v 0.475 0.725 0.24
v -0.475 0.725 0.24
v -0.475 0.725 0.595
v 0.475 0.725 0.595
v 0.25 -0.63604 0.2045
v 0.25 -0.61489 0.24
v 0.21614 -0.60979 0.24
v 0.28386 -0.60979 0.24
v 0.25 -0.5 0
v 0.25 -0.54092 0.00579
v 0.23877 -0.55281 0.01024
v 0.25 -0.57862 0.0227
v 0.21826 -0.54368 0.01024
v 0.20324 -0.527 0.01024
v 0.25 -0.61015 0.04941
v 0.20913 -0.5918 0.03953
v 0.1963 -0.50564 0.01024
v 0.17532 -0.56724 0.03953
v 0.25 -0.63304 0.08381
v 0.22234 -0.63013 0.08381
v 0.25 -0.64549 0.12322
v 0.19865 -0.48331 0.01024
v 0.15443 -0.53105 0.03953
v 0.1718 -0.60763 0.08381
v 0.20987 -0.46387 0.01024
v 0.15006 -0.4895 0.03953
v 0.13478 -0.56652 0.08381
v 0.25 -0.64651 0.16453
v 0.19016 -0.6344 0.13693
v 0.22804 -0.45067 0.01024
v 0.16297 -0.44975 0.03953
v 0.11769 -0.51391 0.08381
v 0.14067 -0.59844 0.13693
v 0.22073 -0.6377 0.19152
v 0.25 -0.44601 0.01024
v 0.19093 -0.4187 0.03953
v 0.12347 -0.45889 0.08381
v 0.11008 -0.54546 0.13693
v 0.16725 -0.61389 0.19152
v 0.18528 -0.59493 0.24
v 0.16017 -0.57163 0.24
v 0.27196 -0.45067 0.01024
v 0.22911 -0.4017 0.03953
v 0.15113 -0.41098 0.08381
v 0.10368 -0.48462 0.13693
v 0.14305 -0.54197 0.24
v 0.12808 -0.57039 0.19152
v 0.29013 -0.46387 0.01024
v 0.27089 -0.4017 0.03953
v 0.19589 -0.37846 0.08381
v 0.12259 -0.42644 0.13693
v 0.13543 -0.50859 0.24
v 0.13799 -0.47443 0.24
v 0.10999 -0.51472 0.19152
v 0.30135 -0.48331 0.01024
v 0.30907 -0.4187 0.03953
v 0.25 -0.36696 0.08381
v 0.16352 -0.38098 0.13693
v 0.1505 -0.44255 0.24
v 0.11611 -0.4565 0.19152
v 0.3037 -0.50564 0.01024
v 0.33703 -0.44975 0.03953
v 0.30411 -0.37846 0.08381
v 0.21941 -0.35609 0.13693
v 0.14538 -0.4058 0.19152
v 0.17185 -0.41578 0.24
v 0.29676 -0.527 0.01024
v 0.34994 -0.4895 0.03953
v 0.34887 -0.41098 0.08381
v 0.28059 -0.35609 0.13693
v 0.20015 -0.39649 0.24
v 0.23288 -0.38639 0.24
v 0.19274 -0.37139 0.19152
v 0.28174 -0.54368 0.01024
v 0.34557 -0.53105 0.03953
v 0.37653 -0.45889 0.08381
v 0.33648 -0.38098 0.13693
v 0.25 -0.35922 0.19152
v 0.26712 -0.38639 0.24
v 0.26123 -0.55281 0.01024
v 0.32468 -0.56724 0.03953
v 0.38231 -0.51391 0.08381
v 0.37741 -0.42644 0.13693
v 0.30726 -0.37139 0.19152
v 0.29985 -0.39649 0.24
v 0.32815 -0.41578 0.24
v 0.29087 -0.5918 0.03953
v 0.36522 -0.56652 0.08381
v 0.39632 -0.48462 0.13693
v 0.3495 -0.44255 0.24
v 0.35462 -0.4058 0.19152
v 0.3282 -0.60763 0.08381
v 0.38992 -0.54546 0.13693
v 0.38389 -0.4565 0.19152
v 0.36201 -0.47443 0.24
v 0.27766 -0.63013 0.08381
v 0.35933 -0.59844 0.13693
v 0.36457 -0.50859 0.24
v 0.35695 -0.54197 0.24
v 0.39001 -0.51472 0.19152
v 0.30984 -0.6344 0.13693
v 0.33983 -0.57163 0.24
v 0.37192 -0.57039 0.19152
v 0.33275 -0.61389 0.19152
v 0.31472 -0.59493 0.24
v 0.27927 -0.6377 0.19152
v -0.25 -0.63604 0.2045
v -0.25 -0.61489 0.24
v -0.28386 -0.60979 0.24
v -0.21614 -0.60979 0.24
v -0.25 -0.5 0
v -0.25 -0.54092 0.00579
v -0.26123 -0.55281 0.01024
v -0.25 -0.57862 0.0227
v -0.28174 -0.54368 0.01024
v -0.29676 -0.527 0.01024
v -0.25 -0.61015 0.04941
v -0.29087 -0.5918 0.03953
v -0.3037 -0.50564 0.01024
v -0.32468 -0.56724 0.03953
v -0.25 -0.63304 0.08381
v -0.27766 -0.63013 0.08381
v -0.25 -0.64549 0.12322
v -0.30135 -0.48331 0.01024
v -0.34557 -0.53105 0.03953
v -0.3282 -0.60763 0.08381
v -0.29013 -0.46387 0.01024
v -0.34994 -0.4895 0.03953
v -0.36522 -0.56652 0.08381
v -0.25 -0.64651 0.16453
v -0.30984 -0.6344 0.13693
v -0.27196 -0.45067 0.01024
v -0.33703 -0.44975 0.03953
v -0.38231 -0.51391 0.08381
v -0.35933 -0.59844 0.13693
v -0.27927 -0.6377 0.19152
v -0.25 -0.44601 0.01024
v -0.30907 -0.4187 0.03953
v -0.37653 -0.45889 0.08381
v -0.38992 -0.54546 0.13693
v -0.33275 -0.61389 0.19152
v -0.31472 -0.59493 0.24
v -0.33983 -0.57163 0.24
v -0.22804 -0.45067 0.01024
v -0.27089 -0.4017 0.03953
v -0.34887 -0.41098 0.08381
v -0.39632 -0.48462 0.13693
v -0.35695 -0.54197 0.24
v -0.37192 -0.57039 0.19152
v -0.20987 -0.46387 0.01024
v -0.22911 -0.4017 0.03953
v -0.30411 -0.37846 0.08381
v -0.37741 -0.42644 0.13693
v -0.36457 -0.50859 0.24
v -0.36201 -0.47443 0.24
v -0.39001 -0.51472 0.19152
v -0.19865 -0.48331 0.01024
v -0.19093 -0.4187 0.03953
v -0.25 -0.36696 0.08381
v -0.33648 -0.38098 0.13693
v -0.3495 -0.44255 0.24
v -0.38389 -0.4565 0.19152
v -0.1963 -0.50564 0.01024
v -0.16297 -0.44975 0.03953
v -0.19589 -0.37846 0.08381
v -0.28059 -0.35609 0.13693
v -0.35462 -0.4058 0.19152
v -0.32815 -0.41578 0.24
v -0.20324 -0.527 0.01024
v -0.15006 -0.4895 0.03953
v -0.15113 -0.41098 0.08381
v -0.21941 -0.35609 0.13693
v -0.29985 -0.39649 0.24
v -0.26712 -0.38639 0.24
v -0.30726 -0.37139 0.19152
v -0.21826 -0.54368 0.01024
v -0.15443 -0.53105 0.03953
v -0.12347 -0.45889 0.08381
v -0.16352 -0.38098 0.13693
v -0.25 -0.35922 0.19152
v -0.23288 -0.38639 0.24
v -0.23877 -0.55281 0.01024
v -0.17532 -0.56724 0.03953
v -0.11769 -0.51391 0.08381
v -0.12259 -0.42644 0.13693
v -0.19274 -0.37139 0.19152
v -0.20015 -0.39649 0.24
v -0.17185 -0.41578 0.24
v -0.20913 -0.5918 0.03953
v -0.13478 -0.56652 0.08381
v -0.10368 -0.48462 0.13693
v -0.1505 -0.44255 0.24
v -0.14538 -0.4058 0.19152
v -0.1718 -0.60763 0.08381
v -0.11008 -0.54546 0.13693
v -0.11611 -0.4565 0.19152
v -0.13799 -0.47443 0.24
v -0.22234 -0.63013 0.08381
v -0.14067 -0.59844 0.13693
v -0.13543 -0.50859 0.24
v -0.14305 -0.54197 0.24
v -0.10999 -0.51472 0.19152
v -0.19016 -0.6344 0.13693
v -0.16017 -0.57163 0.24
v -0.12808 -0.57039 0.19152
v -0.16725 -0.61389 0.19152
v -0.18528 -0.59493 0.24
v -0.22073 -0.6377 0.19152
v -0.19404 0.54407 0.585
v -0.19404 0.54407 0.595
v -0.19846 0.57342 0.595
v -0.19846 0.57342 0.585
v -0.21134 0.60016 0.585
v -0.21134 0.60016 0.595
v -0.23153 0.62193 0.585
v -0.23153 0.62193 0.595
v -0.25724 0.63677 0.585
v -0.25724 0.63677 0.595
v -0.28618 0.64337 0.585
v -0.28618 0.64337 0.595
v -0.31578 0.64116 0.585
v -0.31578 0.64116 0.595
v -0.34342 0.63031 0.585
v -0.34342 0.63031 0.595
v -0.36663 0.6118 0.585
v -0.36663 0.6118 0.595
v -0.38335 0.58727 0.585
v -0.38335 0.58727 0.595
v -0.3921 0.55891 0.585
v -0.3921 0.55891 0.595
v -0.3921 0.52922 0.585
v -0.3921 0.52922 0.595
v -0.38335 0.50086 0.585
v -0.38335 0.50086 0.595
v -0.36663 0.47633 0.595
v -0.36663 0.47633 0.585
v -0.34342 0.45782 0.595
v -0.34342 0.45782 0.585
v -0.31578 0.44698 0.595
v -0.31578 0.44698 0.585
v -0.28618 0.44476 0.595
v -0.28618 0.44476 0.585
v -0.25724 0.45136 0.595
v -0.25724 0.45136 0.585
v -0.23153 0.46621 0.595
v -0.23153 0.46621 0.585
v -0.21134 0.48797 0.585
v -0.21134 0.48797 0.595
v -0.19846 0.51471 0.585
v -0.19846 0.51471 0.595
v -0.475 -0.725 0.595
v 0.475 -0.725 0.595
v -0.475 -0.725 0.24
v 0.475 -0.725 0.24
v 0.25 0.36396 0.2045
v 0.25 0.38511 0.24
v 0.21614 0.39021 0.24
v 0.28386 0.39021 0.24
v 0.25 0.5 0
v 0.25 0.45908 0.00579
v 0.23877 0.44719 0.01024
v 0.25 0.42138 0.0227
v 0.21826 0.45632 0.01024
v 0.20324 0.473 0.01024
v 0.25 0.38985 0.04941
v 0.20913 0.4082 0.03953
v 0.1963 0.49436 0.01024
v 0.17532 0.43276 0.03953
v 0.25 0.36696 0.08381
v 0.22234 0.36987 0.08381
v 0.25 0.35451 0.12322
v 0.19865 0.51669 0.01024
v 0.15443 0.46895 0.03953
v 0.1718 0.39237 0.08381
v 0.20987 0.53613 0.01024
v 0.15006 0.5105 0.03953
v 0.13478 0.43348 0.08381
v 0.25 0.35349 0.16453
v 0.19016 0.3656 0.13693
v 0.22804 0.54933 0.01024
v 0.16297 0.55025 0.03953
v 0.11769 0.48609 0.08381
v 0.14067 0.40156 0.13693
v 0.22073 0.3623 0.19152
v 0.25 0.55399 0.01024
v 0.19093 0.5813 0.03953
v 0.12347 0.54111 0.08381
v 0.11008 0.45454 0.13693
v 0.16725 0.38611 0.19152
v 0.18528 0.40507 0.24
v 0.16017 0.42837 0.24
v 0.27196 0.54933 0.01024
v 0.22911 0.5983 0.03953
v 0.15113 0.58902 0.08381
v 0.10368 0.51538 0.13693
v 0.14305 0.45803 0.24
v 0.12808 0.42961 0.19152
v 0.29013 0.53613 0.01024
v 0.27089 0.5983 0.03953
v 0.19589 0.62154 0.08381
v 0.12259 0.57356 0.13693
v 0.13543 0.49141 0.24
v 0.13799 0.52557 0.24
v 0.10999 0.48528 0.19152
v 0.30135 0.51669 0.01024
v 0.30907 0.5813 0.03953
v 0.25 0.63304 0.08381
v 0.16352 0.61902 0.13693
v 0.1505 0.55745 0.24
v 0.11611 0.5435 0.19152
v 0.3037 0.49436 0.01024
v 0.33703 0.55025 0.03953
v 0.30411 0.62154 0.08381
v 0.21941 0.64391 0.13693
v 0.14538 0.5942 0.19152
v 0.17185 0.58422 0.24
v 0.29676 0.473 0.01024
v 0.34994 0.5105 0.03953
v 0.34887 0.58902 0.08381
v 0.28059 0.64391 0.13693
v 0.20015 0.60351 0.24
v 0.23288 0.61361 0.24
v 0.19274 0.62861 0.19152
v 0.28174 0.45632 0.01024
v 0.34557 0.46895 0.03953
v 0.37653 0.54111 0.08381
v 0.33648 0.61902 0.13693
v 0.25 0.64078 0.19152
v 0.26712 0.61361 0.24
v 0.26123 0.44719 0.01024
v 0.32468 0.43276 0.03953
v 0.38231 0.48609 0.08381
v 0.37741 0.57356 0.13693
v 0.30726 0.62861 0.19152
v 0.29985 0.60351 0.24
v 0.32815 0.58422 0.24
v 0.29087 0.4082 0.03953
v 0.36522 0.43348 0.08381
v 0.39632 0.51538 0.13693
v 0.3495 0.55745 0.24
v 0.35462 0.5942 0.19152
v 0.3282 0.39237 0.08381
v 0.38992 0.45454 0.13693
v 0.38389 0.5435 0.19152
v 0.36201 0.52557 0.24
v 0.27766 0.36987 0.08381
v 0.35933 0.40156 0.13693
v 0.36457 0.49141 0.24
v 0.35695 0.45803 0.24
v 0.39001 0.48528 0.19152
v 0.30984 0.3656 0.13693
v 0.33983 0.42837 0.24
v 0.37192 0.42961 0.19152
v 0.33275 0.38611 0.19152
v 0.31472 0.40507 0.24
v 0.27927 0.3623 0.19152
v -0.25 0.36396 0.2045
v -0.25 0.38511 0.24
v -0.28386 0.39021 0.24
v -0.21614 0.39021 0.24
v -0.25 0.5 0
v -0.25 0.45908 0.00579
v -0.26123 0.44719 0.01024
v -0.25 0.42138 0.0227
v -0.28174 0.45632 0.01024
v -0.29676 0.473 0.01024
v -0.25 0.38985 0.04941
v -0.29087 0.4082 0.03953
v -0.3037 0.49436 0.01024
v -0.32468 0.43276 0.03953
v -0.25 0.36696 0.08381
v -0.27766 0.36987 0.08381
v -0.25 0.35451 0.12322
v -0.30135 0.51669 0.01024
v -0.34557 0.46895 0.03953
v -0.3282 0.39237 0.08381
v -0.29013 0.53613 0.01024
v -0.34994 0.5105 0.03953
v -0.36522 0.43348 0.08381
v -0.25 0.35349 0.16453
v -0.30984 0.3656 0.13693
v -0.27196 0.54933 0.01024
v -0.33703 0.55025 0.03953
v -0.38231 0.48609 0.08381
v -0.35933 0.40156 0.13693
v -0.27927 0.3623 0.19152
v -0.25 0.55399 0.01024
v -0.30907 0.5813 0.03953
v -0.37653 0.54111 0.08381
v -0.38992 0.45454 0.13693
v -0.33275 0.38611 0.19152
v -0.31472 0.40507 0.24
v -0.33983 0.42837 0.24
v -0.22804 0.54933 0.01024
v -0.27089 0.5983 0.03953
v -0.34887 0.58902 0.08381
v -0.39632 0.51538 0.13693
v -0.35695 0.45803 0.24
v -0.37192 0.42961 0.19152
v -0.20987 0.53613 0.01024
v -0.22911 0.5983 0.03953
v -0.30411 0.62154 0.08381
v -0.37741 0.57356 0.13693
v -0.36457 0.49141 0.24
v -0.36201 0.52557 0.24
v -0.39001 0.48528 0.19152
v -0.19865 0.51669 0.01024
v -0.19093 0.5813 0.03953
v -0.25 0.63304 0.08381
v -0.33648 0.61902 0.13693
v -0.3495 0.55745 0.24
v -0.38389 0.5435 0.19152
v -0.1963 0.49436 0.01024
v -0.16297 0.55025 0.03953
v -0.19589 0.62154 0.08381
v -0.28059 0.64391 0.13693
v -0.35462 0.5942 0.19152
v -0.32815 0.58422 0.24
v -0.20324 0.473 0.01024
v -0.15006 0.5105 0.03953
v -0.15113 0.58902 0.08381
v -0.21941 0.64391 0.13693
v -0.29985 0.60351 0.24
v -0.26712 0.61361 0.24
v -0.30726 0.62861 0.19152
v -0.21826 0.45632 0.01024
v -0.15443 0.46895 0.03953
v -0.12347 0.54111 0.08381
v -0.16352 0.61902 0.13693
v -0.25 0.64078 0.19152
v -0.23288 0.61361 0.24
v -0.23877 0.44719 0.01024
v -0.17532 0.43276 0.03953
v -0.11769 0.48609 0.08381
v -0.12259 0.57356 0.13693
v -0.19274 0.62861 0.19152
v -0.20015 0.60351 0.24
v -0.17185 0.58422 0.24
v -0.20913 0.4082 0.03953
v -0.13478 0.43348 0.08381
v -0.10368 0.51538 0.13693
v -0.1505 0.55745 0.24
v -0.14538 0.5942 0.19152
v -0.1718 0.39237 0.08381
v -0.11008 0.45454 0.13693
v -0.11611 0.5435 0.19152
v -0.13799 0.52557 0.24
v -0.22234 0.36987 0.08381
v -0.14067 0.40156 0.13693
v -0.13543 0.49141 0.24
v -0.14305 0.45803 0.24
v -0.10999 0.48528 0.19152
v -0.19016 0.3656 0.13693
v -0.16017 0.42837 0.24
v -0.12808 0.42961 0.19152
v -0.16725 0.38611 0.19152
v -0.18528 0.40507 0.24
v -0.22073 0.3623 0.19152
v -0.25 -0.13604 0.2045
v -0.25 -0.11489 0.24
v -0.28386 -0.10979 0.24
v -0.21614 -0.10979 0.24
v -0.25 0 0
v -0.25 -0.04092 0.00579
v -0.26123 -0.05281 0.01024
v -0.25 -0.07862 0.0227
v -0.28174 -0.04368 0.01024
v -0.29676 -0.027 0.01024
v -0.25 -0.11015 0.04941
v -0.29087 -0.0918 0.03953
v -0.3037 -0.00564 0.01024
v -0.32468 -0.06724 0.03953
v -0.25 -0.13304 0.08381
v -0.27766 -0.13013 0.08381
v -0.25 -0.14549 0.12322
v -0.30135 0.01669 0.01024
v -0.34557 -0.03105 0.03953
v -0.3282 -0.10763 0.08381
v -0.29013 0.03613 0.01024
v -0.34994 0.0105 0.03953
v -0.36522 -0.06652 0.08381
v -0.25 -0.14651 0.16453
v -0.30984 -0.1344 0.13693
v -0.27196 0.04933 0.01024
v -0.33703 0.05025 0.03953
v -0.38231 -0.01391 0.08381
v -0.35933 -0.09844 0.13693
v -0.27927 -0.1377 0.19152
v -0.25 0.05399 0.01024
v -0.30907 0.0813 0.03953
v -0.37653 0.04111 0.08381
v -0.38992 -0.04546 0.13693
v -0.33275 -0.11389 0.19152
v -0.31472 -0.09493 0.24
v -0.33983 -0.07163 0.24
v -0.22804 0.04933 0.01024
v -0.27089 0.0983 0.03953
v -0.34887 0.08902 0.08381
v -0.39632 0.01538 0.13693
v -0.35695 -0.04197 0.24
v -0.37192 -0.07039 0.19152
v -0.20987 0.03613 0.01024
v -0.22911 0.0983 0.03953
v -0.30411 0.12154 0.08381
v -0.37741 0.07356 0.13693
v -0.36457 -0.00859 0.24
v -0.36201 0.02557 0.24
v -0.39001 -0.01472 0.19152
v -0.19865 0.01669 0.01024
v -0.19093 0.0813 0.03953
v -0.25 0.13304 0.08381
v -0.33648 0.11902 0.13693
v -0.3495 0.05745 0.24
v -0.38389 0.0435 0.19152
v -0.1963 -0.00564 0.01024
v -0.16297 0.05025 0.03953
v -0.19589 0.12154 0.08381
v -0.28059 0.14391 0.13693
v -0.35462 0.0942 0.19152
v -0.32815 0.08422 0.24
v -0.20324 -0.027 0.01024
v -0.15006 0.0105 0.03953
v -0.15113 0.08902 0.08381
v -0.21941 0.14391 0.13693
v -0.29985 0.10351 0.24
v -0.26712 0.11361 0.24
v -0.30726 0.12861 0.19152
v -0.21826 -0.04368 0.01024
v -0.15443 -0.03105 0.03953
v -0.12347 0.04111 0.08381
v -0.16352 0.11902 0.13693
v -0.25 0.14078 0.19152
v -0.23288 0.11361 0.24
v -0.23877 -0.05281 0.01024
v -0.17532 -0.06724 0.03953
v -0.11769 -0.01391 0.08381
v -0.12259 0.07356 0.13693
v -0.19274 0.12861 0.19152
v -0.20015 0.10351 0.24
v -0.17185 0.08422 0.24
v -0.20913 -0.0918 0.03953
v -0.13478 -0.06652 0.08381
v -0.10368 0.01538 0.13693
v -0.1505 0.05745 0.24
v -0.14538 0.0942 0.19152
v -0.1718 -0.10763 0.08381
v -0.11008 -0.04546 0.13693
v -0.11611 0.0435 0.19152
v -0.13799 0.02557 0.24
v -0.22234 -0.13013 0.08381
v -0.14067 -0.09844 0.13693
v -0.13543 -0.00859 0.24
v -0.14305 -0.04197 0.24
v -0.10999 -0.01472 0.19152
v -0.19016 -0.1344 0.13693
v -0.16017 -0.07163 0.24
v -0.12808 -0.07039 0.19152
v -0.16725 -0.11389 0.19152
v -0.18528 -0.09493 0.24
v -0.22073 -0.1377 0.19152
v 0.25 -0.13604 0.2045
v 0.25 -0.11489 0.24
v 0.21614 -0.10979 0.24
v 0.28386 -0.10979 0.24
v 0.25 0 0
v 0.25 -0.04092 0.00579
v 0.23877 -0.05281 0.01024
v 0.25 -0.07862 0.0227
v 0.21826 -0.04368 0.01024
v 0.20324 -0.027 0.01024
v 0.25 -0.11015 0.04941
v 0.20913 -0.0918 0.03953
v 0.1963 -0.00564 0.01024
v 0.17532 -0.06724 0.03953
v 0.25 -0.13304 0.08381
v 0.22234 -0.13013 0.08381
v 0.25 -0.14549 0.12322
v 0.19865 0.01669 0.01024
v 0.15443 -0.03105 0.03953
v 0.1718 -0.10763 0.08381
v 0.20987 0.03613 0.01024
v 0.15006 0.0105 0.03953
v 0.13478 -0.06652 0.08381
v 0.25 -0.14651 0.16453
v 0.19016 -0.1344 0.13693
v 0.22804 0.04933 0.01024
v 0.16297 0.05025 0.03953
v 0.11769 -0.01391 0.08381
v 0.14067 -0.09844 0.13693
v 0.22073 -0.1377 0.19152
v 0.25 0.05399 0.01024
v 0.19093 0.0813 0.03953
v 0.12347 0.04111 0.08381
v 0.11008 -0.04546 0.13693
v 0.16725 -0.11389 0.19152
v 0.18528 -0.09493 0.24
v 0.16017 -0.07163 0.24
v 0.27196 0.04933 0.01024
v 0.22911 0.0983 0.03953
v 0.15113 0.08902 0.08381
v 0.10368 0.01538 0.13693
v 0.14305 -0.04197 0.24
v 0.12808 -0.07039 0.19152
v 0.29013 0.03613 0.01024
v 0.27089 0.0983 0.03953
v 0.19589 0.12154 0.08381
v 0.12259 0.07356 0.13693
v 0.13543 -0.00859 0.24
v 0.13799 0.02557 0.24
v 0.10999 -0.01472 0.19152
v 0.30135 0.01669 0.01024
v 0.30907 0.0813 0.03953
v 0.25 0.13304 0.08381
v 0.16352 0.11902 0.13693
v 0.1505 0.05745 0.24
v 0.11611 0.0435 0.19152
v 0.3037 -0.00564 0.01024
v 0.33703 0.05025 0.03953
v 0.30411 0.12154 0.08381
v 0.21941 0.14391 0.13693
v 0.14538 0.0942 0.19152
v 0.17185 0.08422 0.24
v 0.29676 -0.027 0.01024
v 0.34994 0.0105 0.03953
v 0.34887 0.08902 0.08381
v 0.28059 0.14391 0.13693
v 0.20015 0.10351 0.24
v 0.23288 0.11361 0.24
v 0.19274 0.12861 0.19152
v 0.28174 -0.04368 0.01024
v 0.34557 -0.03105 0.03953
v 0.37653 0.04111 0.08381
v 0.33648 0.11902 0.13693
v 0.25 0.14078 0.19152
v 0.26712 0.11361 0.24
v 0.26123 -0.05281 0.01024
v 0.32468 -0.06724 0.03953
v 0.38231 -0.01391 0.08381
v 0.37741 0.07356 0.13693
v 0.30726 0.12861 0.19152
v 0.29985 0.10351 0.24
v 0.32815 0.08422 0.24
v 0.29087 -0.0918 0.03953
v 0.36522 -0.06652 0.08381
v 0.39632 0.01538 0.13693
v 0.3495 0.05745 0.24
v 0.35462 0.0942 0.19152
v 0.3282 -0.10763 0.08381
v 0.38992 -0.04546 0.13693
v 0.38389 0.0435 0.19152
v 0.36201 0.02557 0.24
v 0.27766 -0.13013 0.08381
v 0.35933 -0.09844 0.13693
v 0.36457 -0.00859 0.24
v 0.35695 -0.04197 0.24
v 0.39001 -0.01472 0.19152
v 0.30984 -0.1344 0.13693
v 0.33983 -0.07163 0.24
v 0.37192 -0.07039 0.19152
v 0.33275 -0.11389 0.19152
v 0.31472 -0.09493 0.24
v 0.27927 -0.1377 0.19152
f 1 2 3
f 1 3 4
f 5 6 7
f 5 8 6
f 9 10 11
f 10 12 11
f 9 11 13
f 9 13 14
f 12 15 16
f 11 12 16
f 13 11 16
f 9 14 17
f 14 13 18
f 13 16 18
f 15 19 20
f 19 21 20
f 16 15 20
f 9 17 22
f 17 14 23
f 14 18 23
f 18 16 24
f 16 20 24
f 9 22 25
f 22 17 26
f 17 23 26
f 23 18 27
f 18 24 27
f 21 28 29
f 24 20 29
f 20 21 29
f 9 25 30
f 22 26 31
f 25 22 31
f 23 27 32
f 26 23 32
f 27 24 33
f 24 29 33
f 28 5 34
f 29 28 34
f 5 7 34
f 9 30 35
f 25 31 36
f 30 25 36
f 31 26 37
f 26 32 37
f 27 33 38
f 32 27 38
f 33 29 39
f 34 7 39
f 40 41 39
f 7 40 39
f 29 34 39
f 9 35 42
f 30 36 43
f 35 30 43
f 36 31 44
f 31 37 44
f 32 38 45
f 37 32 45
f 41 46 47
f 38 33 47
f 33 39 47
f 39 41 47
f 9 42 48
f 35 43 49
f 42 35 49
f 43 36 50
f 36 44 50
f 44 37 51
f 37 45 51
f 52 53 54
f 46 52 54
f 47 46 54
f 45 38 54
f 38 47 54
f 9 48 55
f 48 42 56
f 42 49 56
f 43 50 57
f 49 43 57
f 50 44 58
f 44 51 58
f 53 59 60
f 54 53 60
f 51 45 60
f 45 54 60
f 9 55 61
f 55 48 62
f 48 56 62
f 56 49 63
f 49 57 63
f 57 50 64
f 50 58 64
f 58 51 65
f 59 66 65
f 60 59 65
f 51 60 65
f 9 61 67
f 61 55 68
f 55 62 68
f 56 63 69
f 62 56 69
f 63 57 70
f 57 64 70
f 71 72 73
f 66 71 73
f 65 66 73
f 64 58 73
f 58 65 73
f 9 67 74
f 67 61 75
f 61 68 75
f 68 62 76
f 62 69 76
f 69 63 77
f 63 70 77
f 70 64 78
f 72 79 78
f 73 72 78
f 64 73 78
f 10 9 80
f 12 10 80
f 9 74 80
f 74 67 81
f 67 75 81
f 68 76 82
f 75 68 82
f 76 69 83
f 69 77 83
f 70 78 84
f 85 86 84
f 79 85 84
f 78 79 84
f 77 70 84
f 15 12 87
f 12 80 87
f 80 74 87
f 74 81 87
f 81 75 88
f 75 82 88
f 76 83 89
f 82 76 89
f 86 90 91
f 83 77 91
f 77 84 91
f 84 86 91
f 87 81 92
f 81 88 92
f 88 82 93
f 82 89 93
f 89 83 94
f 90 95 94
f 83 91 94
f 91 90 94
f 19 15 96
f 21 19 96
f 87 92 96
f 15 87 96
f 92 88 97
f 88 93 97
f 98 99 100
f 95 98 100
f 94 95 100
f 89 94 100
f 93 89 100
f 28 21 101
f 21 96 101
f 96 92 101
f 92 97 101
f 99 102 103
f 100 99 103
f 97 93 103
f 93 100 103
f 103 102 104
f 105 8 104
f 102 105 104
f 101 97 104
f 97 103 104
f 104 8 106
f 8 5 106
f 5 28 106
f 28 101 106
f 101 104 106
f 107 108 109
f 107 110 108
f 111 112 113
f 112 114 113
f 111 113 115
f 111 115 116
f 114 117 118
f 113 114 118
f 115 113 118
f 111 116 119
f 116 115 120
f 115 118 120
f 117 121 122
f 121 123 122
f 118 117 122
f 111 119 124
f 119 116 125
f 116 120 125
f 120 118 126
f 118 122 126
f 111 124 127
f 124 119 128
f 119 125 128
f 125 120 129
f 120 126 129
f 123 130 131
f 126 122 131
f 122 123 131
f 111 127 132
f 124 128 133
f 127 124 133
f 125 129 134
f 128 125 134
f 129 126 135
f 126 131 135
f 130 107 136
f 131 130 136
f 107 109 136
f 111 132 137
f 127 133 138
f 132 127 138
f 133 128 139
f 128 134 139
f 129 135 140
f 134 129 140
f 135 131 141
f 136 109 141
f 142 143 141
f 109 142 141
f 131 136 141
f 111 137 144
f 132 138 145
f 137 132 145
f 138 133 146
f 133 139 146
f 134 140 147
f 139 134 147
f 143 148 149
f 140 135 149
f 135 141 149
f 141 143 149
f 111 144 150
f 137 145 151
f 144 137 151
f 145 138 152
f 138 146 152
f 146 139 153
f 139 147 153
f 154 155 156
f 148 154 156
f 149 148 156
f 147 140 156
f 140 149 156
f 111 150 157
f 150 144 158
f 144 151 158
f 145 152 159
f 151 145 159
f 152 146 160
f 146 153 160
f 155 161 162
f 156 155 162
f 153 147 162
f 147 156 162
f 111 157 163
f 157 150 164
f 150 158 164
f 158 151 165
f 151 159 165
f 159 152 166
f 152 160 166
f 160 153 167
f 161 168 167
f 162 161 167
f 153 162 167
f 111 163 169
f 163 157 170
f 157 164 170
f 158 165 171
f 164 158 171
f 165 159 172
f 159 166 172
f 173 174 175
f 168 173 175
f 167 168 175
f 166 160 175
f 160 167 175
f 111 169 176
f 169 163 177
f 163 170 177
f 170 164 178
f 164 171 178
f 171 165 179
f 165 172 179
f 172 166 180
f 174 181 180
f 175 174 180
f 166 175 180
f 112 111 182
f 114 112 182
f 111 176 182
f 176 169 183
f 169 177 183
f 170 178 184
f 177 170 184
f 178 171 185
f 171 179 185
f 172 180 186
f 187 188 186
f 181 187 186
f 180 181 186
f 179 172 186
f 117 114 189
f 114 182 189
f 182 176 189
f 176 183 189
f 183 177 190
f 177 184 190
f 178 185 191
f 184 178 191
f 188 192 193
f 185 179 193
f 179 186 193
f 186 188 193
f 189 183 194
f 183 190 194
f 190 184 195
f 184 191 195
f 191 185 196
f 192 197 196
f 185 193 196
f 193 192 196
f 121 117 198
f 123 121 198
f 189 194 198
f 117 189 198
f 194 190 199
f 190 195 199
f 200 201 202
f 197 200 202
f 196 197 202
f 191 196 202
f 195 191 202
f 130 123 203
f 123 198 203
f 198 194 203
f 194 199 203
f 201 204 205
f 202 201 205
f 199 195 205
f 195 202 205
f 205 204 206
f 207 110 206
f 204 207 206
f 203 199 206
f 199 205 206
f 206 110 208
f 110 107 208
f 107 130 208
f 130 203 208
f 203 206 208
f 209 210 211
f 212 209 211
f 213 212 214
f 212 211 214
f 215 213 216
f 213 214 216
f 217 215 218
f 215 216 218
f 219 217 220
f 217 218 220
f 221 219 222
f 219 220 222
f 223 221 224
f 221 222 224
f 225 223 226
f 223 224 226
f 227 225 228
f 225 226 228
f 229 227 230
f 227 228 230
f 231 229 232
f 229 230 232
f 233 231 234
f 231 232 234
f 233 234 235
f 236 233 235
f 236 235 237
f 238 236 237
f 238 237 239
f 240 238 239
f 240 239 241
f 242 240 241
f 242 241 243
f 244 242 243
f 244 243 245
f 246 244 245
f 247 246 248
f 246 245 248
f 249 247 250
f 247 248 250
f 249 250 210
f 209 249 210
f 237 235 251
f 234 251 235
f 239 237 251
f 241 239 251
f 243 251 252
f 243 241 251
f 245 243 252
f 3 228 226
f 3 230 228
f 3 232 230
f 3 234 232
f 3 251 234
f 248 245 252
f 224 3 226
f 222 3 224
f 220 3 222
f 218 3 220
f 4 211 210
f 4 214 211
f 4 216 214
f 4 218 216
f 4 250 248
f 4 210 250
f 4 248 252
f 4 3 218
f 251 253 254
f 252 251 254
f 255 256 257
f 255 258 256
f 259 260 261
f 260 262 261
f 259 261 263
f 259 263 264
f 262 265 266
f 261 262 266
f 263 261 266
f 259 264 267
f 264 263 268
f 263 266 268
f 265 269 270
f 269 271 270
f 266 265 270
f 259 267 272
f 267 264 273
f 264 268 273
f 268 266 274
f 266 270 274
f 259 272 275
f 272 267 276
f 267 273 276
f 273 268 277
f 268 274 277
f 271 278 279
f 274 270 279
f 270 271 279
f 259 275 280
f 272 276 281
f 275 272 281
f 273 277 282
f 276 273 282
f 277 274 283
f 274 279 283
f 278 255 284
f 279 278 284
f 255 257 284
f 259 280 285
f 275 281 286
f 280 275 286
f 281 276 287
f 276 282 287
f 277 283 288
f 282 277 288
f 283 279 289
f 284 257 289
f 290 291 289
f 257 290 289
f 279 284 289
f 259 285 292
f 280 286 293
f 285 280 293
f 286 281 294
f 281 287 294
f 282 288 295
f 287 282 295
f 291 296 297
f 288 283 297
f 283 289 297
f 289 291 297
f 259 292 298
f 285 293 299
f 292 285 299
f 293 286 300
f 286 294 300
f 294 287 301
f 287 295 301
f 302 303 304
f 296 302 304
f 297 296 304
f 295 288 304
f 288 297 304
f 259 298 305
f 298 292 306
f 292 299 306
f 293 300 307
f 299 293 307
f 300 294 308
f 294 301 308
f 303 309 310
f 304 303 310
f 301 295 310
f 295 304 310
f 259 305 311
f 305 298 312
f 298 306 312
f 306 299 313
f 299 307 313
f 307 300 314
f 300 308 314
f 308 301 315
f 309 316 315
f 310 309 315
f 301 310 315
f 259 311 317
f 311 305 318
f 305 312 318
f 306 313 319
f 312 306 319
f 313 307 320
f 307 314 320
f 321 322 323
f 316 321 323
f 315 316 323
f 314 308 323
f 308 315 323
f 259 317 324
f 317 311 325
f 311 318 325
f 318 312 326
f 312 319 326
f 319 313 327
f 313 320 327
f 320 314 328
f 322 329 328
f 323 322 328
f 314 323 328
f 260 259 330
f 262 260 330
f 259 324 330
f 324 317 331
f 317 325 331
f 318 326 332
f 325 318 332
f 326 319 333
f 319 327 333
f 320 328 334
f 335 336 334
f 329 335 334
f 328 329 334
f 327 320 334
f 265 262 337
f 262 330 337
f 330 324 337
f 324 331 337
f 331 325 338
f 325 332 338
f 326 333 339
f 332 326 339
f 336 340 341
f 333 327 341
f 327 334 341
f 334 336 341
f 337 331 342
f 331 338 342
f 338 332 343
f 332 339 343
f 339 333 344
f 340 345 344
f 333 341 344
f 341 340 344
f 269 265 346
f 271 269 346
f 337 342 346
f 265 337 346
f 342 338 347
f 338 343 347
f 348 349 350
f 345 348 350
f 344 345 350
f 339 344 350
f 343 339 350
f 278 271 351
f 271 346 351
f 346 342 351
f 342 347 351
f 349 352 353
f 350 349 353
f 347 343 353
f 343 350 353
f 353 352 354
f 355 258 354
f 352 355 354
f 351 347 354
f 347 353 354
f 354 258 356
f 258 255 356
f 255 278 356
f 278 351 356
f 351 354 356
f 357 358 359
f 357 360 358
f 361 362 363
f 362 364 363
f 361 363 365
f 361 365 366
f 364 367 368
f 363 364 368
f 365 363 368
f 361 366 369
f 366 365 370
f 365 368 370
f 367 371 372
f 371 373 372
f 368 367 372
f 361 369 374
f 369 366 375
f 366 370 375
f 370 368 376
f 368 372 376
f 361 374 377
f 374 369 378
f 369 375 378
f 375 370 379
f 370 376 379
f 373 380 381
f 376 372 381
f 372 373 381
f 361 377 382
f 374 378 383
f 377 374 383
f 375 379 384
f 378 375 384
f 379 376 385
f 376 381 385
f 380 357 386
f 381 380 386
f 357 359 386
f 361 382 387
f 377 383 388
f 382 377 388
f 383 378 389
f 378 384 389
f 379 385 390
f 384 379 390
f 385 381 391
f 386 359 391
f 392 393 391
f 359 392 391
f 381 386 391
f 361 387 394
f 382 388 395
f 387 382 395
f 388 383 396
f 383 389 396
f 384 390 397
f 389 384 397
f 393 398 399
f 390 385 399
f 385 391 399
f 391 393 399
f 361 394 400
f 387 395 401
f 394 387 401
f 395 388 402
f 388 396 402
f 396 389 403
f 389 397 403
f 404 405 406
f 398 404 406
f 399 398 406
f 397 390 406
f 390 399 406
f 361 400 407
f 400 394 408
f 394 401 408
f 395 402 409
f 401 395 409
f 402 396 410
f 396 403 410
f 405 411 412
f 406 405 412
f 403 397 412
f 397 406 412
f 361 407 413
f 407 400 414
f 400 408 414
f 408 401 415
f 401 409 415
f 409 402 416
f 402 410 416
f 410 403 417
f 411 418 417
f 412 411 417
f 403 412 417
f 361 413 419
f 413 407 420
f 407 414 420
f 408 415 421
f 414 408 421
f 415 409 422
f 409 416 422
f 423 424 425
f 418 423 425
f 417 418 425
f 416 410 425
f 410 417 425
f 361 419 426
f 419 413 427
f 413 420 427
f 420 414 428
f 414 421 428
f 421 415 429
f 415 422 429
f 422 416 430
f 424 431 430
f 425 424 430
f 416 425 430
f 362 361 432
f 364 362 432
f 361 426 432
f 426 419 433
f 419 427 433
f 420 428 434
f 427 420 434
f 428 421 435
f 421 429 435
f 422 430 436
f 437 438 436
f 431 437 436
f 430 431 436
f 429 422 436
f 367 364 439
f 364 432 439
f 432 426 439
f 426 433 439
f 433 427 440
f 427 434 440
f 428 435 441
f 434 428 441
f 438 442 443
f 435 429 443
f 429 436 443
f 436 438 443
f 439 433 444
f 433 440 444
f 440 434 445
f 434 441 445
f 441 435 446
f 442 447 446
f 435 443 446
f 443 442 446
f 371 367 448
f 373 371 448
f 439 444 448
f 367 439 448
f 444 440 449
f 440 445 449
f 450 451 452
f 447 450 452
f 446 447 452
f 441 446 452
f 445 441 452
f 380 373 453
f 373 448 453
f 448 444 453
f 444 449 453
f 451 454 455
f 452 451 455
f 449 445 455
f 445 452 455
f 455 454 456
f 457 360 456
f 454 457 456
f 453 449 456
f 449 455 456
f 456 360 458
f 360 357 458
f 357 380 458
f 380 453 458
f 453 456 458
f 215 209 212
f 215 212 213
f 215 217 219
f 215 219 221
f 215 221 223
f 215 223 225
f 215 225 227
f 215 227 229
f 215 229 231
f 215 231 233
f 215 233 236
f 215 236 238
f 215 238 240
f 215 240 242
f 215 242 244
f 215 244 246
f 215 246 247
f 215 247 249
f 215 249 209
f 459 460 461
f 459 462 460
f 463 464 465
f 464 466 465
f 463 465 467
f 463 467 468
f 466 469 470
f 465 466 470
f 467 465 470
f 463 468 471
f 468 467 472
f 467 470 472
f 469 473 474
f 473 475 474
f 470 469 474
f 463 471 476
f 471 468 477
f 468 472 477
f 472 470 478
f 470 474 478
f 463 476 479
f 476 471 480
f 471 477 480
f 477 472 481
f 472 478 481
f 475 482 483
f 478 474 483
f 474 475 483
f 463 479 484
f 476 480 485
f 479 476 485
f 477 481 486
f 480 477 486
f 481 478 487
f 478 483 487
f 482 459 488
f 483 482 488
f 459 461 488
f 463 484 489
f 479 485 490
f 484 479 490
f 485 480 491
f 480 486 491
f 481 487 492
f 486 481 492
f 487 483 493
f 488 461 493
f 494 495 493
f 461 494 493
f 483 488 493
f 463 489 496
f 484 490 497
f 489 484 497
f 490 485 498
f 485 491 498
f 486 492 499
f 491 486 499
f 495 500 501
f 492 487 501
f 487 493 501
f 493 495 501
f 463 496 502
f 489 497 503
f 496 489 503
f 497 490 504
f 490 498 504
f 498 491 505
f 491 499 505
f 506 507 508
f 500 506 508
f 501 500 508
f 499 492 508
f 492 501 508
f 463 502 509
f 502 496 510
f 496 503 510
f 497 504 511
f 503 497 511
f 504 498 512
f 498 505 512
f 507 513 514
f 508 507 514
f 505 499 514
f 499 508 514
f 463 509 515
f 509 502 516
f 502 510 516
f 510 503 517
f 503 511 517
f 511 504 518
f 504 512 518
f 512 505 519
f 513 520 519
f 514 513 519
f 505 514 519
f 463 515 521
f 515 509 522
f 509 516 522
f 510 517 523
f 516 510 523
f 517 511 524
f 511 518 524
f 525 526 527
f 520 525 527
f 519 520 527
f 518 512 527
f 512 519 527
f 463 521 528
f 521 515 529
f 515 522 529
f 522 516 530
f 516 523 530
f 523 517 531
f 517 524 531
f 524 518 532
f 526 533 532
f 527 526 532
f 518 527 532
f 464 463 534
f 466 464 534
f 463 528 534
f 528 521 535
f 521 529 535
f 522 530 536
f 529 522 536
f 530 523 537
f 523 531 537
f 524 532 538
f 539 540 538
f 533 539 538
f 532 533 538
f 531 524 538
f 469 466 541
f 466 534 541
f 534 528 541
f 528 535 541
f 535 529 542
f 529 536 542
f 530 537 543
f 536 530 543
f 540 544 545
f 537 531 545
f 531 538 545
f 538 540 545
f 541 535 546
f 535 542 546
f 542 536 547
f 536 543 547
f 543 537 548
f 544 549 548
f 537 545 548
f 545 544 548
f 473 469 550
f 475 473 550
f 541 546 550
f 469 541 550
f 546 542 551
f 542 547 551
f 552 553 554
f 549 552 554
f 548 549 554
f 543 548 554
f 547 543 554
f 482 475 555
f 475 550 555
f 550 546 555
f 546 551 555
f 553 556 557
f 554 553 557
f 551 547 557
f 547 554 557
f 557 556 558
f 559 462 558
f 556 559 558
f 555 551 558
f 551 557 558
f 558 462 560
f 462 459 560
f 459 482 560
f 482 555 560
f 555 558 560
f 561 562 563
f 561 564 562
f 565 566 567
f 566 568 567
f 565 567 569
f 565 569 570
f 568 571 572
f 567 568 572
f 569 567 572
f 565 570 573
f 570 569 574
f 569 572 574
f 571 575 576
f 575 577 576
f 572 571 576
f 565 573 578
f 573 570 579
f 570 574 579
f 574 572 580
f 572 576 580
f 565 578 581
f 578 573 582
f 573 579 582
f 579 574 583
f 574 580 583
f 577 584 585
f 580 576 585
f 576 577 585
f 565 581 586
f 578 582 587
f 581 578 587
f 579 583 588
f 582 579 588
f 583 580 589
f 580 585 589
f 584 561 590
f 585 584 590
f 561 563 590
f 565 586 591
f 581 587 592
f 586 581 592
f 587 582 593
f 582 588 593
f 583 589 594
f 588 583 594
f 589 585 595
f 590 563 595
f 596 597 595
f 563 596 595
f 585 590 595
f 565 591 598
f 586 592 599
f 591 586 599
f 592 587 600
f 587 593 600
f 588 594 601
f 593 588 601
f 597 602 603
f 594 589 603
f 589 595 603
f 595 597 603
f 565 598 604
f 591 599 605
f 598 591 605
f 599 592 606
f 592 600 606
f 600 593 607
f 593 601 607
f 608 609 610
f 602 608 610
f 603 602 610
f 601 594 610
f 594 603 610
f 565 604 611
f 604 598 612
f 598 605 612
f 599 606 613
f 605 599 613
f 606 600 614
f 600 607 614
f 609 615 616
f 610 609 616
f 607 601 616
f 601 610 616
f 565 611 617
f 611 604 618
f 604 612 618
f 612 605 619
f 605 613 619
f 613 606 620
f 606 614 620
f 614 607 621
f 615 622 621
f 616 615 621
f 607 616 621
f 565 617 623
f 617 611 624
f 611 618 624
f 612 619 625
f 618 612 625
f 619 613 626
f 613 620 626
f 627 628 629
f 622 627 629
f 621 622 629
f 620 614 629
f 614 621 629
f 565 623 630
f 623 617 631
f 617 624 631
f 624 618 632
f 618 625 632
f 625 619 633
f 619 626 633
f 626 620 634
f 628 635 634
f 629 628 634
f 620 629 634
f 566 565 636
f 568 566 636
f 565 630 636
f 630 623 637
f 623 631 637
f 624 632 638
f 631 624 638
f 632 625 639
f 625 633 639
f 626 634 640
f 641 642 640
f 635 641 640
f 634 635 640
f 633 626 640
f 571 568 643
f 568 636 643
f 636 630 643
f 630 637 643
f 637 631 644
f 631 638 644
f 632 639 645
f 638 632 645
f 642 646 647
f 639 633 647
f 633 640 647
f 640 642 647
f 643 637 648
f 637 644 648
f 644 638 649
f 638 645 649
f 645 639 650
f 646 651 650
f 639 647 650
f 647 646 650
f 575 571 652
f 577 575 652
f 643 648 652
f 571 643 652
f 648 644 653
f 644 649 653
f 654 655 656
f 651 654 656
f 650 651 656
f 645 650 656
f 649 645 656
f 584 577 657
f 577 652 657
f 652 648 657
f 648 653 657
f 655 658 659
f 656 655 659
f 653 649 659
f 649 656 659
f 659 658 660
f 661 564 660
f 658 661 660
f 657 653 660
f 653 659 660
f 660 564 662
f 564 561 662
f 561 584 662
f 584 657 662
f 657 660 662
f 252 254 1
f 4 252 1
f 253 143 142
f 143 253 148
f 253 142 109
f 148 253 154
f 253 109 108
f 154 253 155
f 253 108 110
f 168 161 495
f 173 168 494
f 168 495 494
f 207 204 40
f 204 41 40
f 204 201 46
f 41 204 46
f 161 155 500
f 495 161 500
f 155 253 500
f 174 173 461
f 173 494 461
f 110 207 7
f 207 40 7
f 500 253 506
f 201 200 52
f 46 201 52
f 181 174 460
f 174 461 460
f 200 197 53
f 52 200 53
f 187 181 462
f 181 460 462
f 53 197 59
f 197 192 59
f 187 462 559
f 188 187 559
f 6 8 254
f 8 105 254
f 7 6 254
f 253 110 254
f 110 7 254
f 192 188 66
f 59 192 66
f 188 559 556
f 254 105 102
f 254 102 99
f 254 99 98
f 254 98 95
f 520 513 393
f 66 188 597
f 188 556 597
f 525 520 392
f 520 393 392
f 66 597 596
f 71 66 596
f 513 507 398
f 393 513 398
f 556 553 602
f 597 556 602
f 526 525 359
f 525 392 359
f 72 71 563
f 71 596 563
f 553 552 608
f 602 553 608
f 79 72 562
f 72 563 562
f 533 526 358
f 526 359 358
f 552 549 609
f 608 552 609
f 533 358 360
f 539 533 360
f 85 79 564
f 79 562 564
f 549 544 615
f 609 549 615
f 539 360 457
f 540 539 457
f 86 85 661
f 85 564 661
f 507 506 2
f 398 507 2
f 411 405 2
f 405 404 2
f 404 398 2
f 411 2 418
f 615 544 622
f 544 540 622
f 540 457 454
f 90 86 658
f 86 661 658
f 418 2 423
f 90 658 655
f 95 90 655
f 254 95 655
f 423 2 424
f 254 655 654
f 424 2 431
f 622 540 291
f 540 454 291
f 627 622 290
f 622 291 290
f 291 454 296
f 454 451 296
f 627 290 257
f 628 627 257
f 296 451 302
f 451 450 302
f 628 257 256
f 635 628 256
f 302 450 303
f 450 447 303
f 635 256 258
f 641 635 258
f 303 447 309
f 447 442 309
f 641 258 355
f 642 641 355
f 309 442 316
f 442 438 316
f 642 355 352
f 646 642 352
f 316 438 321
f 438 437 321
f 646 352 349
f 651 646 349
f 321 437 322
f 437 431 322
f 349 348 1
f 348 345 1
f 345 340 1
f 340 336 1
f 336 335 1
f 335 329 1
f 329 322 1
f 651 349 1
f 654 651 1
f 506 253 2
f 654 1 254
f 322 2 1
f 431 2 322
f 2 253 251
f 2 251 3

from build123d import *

# Parameters (mm, degrees)
BOSS_EXTRUDE1_START  = 0.24
SKETCH1_W            = 0.95
SKETCH1_H            = 1.45
BOSS_EXTRUDE1_DEPTH  = 0.355
LPATTERN1_COUNT      = 2
LPATTERN1_PITCH      = 0.5
LPATTERN1_COUNT_DIR2 = 3
LPATTERN1_PITCH_DIR2 = 0.5
SKETCH3_R            = 0.0995871
CUT_EXTRUDE1_DEPTH   = 0.01


with BuildPart() as part:
    # Sketch1 → Boss-Extrude1 (new body)
    with BuildSketch(Plane.XY.offset(BOSS_EXTRUDE1_START)):
        Rectangle(SKETCH1_W, SKETCH1_H)
    extrude(amount=BOSS_EXTRUDE1_DEPTH)

    # Sketch2 → Revolve1 (revolve)
    with BuildSketch(Plane(origin=(0.25, 0, 0), x_dir=(0, 0, -1), z_dir=(1, 0, 0))):
        with BuildLine():
            Line((-0.295, 0.5), (0, 0.5))
            ThreePointArc((0, 0.5), (-0.1475, 0.3525), (-0.295, 0.5))
        make_face()
    revolve1 = revolve(axis=Axis((0.25, 0.5, 0.295), (0, 0, -1)))

    # LPattern1: Revolve1 2 × 3
    with Locations(*[(-i * LPATTERN1_PITCH, -j * LPATTERN1_PITCH_DIR2, 0) for i in range(LPATTERN1_COUNT) for j in range(LPATTERN1_COUNT_DIR2) if (i, j) != (0, 0)]):
        add(revolve1)

    # Sketch3 → Cut-Extrude1 (cut)
    with BuildSketch(Plane.XY.offset(0.595)):
        with Locations((-0.293622617, 0.544065437)):
            Circle(SKETCH3_R)
    extrude(amount=-CUT_EXTRUDE1_DEPTH, mode=Mode.SUBTRACT)


solid = part.part
